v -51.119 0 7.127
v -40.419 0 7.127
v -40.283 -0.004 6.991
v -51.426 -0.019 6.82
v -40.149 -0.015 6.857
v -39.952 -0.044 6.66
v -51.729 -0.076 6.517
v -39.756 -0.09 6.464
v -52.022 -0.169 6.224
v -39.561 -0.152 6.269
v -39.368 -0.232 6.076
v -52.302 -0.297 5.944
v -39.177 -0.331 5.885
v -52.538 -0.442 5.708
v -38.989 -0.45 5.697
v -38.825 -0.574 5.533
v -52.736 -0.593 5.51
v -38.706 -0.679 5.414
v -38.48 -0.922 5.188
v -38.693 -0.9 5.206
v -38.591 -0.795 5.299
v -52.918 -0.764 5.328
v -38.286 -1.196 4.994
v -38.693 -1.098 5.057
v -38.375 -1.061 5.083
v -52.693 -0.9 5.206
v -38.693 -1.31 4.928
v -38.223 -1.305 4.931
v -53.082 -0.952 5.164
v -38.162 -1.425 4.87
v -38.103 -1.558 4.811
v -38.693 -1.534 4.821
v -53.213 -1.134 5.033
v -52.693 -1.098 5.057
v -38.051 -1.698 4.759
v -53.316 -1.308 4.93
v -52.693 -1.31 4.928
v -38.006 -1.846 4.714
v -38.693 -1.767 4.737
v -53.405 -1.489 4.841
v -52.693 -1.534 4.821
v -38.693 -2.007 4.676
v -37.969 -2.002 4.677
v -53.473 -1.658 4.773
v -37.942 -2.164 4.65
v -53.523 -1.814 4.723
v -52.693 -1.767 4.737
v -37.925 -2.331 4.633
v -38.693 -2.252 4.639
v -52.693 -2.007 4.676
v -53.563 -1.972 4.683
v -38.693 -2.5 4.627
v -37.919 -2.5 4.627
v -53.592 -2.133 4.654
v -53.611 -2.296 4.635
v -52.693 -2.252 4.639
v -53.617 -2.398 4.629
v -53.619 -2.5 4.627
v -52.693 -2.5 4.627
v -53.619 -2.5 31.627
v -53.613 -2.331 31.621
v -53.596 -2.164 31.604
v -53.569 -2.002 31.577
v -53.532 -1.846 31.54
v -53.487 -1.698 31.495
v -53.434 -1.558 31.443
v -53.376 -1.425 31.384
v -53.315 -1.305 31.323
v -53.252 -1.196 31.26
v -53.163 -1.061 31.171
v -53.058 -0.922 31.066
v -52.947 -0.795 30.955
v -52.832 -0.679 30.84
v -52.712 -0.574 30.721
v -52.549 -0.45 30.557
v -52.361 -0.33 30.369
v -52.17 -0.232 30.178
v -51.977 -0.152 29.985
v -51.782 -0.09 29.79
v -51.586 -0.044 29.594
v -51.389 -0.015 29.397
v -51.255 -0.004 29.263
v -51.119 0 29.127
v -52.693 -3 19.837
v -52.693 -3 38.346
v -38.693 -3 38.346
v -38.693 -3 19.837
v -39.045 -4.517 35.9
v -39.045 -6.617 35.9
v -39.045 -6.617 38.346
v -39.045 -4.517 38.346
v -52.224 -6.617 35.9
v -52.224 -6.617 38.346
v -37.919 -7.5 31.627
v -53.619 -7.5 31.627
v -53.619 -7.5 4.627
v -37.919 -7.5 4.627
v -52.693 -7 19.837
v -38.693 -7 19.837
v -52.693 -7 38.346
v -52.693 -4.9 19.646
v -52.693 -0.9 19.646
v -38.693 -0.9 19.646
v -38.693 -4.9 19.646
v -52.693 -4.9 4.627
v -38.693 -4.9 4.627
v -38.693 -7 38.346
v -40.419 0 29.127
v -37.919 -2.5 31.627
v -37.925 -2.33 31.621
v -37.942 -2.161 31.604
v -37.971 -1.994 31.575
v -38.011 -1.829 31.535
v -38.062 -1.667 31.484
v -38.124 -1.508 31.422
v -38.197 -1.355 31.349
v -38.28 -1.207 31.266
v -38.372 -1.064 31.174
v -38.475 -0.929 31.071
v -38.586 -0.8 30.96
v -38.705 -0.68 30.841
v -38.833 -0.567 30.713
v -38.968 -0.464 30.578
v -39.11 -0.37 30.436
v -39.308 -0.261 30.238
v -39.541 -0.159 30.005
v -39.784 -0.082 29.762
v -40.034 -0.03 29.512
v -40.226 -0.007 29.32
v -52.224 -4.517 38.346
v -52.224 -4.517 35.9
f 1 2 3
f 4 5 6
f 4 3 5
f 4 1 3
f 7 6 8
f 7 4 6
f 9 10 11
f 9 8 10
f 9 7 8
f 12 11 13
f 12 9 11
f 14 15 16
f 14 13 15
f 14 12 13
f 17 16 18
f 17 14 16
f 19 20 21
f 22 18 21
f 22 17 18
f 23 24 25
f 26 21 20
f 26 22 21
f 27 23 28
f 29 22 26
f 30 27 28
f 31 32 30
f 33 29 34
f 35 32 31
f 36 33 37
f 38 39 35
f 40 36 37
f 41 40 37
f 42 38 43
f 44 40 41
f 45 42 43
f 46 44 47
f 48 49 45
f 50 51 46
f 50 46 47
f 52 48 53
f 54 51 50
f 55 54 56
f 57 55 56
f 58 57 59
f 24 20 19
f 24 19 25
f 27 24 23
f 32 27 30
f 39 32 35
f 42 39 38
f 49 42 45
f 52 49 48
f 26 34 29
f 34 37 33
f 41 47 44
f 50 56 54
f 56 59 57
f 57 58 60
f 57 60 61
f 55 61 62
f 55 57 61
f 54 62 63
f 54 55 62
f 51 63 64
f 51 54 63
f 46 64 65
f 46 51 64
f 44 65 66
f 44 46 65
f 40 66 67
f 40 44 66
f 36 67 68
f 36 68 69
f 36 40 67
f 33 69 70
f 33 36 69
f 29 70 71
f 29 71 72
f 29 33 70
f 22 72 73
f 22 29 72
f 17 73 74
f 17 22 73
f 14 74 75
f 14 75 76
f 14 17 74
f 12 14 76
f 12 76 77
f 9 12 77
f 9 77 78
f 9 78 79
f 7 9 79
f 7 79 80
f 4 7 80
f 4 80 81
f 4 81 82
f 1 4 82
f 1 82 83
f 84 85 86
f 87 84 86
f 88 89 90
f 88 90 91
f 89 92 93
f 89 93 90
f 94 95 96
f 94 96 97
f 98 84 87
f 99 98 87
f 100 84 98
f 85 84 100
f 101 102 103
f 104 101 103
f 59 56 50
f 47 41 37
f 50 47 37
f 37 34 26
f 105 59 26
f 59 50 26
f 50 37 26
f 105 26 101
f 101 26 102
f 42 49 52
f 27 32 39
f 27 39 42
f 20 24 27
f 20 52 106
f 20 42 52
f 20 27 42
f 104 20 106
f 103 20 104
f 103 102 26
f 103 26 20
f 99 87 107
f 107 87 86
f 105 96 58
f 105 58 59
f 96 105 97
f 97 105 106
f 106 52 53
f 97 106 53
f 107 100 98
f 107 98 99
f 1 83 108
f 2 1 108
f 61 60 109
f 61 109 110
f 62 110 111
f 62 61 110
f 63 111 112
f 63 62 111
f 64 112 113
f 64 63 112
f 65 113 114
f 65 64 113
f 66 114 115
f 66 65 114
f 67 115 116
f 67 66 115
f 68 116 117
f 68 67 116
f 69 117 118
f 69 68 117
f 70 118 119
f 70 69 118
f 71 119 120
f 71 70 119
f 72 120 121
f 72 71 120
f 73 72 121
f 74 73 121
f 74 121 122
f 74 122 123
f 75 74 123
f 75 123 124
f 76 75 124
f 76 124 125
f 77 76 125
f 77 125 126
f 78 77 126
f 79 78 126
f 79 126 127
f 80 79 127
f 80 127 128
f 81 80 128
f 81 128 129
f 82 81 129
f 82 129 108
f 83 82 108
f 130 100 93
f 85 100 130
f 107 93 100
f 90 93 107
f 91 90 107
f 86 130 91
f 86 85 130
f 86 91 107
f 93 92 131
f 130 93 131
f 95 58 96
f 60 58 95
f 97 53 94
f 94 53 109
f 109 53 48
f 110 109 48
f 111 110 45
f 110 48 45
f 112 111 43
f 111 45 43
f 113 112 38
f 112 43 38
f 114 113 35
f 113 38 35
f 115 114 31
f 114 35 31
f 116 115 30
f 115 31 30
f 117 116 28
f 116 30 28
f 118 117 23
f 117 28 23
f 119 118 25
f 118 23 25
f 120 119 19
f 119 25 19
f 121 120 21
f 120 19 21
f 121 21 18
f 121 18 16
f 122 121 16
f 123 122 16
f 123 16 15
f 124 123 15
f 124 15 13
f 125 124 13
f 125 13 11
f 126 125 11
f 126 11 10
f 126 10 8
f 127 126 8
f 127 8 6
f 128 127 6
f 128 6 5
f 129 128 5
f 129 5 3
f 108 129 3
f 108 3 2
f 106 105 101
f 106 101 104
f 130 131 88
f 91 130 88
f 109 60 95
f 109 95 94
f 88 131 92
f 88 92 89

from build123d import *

# Parameters (mm, degrees)
F0_W        = 15.7
F0_H        = 27
F1_DEPTH    = 7.5
F2_W        = 14
F2_H        = 18.5080650263
F3_DEPTH    = 4
F7_T1_DEPTH = 28.2
F7_T3_DEPTH = 39.5
F8_W        = 13.1793060163
F8_H        = 2.1
F9_DEPTH    = 7.5


# Not quite as in the source:
# - a fillet or chamfer that OpenCascade refuses, or shapes differently, is made with other operations: its cross-section is extruded or revolved along the edge and cut away or added


with BuildPart() as f1:
    # F0 (on Front) → F1 (new body)
    with BuildSketch(Plane.XZ):
        with Locations((-45.7689563572, 18.127016373)):
            Rectangle(F0_W, F0_H)
    extrude(amount=F1_DEPTH)


with BuildPart() as f3:
    # F2 (on Front) → F3 (new body)
    with BuildSketch(Plane.XZ):
        with Locations((-45.8931468725, -4.8084680457)):
            Rectangle(F2_W, F2_H)
    extrude(amount=F3_DEPTH)


with BuildPart() as f3_1:
    # F4: moved
    add(f3.part.moved(Location((0.2, -0.9, 15.2))))


with BuildPart() as f1_1:
    add(f1.part)

    # F5: cut F3
    add(f3_1.part, mode=Mode.SUBTRACT)

    # F7: fillet of radius 2.5 on 4 edges, made by hand

    # F7_s2 → F7_t1 (cut)
    with BuildSketch(Plane.YZ.offset(-59.8689563572)):
        with BuildLine():
            ThreePointArc((-2.5, 31.627016373), (-0.732233047, 30.8947833259), (0, 29.127016373))
            Line((0, 29.127016373), (0, 31.627016373))
            Line((0, 31.627016373), (-2.5, 31.627016373))
        make_face()
        with BuildLine():
            ThreePointArc((0, 7.127016373), (-0.732233047, 5.35924942), (-2.5, 4.627016373))
            Line((-2.5, 4.627016373), (0, 4.627016373))
            Line((0, 4.627016373), (0, 7.127016373))
        make_face()
    extrude(amount=F7_T1_DEPTH, mode=Mode.SUBTRACT)

    # F7_s4 → F7_t3 (cut)
    with BuildSketch(Plane.XY.offset(-1.622983627)):
        with BuildLine():
            ThreePointArc((-53.6189563572, -2.5), (-52.8867233102, -0.732233047), (-51.1189563572, 0))
            Line((-51.1189563572, 0), (-53.6189563572, 0))
            Line((-53.6189563572, 0), (-53.6189563572, -2.5))
        make_face()
        with BuildLine():
            ThreePointArc((-37.9189563572, -2.5), (-38.6511894043, -0.732233047), (-40.4189563572, 0))
            Line((-40.4189563572, 0), (-37.9189563572, 0))
            Line((-37.9189563572, 0), (-37.9189563572, -2.5))
        make_face()
    extrude(amount=F7_T3_DEPTH, mode=Mode.SUBTRACT)


with BuildPart() as f3_2:
    # F6: moved
    add(f3_1.part.moved(Location((0, -2.1, 18.7))))


with BuildPart() as f9:
    # F8 (on Top) → F9 (new body)
    with BuildSketch(Plane.XY):
        with Locations((-45.6346645951, -5.5668568239)):
            Rectangle(F8_W, F8_H)
    extrude(amount=F9_DEPTH)


with BuildPart() as f9_1:
    # F10: moved
    add(f9.part.moved(Location((0, 0, 35.9))))


with BuildPart() as f3_3:
    add(f3_2.part)

    # F11: cut F9
    add(f9_1.part, mode=Mode.SUBTRACT)


solid = Compound([f1_1.part, f3_3.part])
